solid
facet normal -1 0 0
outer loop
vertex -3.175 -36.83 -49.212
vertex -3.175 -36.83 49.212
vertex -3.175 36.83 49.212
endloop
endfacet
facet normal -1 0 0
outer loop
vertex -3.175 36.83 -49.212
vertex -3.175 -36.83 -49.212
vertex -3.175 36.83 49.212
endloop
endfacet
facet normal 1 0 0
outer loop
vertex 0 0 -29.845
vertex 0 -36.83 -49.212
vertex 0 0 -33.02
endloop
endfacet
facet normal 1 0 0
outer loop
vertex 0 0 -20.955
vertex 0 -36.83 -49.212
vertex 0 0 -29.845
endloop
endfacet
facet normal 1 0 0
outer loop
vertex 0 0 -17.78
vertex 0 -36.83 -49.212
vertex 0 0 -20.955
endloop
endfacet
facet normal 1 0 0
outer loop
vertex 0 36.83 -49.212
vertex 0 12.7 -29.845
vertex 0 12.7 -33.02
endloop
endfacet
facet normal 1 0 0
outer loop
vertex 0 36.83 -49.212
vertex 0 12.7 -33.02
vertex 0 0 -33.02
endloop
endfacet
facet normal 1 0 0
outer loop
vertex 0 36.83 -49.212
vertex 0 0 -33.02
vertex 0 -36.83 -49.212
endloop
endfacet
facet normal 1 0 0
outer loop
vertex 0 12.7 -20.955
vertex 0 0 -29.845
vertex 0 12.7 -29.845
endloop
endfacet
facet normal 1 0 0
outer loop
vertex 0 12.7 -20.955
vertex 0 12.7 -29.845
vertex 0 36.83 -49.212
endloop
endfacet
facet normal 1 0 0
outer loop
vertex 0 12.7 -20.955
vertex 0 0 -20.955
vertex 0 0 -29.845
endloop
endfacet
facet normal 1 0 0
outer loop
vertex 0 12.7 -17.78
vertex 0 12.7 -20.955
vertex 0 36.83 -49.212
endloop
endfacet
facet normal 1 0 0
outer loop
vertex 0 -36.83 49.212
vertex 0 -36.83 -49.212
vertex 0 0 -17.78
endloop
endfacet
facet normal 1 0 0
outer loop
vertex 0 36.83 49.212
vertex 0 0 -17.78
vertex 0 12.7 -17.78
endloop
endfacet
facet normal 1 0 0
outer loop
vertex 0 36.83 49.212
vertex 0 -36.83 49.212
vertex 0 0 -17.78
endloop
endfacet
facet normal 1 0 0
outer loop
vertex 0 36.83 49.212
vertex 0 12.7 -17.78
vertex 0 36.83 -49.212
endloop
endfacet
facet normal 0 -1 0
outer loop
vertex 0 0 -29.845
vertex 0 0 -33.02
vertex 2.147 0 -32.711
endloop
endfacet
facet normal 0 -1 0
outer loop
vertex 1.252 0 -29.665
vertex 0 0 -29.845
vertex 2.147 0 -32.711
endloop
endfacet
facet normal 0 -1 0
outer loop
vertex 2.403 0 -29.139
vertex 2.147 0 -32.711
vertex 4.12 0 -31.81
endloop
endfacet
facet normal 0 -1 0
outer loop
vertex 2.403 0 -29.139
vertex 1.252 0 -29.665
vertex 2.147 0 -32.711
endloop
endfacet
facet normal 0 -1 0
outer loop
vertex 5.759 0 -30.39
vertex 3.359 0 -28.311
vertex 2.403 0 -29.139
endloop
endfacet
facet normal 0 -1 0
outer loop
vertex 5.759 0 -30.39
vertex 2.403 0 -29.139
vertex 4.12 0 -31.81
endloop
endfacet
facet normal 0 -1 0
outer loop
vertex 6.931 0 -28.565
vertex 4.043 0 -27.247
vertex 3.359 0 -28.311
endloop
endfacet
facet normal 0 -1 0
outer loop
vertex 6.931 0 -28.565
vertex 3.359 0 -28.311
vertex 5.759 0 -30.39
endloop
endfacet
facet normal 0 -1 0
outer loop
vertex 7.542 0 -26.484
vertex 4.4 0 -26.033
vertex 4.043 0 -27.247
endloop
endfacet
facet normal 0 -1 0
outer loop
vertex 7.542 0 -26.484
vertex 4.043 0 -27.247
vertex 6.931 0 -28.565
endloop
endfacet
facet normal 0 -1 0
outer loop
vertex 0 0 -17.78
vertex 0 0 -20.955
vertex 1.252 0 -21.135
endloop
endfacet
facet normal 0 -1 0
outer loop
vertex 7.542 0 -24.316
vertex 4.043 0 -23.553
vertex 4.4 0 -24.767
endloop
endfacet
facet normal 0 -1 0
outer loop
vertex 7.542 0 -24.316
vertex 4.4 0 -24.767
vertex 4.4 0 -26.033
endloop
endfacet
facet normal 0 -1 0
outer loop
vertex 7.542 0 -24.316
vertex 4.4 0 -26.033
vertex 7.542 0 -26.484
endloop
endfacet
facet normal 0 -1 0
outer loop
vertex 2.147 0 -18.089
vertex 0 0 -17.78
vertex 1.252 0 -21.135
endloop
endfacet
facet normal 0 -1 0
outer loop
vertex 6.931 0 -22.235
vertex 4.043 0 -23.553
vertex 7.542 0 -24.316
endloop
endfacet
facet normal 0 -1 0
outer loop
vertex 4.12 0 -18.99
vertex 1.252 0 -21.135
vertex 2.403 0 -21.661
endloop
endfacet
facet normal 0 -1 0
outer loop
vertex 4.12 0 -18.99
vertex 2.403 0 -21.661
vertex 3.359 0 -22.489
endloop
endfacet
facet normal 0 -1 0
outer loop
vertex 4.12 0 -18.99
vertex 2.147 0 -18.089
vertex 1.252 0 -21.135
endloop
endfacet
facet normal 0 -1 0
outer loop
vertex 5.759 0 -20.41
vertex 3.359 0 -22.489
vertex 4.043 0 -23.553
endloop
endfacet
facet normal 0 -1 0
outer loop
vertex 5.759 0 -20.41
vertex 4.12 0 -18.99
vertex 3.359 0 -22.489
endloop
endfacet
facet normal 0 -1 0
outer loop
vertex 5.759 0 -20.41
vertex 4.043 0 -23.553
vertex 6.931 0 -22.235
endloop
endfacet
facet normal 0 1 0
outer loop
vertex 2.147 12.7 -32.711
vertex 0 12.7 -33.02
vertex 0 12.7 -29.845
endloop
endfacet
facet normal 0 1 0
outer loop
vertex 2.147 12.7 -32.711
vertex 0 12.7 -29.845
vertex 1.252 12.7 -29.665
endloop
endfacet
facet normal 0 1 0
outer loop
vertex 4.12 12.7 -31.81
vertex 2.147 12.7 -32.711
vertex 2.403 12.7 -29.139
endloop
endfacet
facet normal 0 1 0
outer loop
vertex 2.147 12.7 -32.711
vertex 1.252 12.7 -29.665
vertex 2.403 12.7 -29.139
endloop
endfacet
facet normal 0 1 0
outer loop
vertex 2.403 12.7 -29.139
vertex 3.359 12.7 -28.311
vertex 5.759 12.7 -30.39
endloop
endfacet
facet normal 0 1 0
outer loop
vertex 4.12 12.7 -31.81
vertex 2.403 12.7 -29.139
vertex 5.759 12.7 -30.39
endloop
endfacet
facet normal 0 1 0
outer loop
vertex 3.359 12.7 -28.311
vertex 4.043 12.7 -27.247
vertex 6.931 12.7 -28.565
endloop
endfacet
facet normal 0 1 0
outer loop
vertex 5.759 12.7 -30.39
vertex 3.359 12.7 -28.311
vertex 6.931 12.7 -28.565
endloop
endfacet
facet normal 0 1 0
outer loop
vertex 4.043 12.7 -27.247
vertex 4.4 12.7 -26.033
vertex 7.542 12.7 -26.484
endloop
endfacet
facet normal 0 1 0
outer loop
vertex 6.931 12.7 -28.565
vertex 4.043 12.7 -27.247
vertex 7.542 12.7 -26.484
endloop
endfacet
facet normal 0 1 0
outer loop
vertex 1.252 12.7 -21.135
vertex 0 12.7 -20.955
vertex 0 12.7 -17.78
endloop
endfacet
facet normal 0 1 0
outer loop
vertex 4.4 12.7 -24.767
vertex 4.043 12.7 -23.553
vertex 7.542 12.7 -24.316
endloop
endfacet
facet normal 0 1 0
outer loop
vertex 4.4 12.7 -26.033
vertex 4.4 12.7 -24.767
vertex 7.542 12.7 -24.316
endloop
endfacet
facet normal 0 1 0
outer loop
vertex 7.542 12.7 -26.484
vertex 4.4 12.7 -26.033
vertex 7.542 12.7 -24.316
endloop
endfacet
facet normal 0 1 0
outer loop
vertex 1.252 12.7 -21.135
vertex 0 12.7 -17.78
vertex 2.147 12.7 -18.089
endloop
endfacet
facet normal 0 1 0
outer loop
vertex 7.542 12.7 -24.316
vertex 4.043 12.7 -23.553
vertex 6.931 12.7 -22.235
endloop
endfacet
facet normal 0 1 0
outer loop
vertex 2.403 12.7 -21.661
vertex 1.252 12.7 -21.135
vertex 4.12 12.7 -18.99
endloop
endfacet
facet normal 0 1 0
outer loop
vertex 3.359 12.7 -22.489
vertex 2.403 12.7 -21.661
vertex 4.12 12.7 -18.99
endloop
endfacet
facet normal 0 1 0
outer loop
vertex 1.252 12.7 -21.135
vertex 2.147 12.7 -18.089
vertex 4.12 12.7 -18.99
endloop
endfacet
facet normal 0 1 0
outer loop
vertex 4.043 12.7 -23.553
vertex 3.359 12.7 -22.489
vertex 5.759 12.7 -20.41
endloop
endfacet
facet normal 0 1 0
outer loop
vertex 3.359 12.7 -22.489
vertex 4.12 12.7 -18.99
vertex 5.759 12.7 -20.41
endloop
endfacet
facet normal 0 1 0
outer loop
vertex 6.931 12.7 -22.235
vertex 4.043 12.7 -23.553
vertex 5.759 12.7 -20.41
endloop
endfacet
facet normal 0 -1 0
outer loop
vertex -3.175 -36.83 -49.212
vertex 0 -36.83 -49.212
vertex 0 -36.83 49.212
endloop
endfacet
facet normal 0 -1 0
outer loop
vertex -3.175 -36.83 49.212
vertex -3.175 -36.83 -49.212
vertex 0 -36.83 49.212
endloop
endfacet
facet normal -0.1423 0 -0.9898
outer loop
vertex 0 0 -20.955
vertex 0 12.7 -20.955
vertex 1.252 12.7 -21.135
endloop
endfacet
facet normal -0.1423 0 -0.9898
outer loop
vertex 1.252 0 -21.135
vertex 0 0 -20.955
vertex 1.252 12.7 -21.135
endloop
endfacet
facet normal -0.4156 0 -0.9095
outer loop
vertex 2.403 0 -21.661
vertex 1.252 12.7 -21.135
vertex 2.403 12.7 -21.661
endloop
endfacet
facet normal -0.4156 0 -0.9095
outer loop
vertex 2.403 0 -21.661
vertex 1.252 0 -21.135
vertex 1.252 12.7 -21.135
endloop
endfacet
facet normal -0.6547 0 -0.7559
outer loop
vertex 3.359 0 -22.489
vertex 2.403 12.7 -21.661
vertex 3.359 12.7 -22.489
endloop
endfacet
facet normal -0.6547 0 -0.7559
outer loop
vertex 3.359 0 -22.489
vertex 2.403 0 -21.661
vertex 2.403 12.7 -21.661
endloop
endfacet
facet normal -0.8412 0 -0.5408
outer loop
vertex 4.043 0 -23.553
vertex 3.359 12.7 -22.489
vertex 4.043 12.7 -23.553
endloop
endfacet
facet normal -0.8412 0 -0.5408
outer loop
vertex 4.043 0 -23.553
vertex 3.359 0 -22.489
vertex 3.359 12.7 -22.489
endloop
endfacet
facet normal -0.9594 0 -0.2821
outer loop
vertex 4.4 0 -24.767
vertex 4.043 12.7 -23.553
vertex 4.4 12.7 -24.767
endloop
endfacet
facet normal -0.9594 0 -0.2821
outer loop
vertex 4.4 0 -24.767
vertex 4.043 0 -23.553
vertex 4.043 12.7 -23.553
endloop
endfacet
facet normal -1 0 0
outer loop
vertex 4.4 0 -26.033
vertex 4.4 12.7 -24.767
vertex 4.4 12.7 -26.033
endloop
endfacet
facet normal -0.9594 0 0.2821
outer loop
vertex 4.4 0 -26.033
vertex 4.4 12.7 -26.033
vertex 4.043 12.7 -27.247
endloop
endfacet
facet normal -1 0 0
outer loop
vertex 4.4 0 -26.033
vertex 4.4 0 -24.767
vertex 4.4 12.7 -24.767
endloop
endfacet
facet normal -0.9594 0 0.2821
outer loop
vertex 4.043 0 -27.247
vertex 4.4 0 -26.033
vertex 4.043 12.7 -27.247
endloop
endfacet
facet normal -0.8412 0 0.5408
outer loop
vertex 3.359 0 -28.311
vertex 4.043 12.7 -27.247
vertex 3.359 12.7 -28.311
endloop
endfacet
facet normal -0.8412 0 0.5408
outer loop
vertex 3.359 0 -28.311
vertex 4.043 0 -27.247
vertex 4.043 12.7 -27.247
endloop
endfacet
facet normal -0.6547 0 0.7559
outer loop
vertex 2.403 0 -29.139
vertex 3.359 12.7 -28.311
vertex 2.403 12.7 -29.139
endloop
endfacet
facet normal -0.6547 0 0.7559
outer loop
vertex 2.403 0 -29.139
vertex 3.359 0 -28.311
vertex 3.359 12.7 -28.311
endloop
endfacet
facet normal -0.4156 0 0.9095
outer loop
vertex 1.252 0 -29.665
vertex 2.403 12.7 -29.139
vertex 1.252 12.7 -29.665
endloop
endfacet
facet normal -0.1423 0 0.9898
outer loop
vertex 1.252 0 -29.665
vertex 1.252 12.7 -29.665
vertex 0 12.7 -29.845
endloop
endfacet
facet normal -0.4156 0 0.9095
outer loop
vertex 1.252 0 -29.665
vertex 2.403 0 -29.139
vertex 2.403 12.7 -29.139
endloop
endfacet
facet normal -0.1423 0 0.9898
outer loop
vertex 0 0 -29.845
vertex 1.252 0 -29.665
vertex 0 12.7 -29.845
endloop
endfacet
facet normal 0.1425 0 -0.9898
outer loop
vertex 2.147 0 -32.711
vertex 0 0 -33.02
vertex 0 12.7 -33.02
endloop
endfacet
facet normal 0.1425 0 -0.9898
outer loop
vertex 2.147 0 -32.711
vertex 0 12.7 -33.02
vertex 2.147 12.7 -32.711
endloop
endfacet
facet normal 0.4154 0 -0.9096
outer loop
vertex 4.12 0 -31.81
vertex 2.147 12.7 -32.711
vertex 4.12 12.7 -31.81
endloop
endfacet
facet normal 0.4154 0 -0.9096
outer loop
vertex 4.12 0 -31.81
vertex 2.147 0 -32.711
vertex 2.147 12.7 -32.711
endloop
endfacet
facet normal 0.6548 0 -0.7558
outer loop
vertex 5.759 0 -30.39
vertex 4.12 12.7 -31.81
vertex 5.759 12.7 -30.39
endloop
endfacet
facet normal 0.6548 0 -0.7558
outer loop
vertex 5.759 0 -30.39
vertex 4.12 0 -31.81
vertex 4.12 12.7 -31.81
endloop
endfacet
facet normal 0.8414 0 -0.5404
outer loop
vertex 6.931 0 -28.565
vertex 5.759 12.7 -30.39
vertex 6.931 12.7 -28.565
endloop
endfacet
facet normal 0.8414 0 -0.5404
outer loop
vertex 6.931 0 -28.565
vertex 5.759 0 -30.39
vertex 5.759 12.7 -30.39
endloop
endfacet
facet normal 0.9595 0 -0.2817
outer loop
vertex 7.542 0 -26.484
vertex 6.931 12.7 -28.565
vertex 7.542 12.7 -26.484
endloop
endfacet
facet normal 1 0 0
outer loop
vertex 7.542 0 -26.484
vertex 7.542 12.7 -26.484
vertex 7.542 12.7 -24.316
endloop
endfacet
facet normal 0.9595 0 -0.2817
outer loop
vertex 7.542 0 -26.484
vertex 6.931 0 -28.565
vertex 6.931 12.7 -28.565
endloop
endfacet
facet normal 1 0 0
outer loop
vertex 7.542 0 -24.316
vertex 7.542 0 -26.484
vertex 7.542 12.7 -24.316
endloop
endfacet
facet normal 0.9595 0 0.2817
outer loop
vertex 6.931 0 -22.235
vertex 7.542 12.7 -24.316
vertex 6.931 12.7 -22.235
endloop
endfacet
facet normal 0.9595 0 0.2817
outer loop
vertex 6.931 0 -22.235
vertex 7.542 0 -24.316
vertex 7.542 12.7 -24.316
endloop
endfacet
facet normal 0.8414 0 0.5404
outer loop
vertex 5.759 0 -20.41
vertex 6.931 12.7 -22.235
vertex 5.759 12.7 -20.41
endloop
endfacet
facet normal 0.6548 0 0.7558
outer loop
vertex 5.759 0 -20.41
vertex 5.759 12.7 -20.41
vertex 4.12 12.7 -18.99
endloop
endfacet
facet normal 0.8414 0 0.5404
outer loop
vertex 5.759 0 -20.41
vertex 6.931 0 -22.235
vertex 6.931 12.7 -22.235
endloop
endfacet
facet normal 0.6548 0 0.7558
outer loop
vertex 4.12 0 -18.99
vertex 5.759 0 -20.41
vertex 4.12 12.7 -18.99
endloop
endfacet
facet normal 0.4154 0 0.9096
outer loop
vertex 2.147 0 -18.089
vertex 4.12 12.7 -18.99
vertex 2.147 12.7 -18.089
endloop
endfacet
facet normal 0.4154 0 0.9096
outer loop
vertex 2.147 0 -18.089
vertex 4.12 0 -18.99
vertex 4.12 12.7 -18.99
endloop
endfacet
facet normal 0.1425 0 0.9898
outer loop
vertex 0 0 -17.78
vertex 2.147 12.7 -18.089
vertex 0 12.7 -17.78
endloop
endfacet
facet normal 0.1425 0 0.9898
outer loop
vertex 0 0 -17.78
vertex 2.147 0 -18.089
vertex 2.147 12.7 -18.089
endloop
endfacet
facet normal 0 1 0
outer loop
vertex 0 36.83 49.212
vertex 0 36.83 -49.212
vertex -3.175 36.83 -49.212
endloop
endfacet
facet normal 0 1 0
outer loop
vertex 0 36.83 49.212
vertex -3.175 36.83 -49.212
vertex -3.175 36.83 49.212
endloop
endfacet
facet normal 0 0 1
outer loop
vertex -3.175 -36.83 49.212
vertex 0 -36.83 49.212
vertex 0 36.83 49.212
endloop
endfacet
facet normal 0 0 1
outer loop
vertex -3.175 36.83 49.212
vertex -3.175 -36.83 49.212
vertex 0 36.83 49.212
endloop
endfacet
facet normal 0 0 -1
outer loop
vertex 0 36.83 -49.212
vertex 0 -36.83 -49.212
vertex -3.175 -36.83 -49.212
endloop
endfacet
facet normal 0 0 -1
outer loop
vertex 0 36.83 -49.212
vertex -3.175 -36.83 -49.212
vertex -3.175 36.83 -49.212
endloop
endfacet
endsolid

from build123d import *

# Parameters (mm, degrees)
F0_W     = 73.66
F0_H     = 98.425
F1_DEPTH = 3.175
F3_DEPTH = 12.7


with BuildPart() as f1:
    # F0 (on Right) → F1 (new body)
    with BuildSketch(Plane.YZ):
        Rectangle(F0_W, F0_H)
    extrude(amount=-F1_DEPTH)

    # F2 (on Front) → F3 (join)
    with BuildSketch(Plane.XZ):
        with BuildLine():
            Line((0, -29.845), (0, -33.02))
            ThreePointArc((0, -33.02), (7.62, -25.4), (0, -17.78))
            Line((0, -17.78), (0, -20.955))
            ThreePointArc((0, -20.955), (4.445, -25.4), (0, -29.845))
        make_face()
    extrude(amount=-F3_DEPTH)


solid = f1.part
